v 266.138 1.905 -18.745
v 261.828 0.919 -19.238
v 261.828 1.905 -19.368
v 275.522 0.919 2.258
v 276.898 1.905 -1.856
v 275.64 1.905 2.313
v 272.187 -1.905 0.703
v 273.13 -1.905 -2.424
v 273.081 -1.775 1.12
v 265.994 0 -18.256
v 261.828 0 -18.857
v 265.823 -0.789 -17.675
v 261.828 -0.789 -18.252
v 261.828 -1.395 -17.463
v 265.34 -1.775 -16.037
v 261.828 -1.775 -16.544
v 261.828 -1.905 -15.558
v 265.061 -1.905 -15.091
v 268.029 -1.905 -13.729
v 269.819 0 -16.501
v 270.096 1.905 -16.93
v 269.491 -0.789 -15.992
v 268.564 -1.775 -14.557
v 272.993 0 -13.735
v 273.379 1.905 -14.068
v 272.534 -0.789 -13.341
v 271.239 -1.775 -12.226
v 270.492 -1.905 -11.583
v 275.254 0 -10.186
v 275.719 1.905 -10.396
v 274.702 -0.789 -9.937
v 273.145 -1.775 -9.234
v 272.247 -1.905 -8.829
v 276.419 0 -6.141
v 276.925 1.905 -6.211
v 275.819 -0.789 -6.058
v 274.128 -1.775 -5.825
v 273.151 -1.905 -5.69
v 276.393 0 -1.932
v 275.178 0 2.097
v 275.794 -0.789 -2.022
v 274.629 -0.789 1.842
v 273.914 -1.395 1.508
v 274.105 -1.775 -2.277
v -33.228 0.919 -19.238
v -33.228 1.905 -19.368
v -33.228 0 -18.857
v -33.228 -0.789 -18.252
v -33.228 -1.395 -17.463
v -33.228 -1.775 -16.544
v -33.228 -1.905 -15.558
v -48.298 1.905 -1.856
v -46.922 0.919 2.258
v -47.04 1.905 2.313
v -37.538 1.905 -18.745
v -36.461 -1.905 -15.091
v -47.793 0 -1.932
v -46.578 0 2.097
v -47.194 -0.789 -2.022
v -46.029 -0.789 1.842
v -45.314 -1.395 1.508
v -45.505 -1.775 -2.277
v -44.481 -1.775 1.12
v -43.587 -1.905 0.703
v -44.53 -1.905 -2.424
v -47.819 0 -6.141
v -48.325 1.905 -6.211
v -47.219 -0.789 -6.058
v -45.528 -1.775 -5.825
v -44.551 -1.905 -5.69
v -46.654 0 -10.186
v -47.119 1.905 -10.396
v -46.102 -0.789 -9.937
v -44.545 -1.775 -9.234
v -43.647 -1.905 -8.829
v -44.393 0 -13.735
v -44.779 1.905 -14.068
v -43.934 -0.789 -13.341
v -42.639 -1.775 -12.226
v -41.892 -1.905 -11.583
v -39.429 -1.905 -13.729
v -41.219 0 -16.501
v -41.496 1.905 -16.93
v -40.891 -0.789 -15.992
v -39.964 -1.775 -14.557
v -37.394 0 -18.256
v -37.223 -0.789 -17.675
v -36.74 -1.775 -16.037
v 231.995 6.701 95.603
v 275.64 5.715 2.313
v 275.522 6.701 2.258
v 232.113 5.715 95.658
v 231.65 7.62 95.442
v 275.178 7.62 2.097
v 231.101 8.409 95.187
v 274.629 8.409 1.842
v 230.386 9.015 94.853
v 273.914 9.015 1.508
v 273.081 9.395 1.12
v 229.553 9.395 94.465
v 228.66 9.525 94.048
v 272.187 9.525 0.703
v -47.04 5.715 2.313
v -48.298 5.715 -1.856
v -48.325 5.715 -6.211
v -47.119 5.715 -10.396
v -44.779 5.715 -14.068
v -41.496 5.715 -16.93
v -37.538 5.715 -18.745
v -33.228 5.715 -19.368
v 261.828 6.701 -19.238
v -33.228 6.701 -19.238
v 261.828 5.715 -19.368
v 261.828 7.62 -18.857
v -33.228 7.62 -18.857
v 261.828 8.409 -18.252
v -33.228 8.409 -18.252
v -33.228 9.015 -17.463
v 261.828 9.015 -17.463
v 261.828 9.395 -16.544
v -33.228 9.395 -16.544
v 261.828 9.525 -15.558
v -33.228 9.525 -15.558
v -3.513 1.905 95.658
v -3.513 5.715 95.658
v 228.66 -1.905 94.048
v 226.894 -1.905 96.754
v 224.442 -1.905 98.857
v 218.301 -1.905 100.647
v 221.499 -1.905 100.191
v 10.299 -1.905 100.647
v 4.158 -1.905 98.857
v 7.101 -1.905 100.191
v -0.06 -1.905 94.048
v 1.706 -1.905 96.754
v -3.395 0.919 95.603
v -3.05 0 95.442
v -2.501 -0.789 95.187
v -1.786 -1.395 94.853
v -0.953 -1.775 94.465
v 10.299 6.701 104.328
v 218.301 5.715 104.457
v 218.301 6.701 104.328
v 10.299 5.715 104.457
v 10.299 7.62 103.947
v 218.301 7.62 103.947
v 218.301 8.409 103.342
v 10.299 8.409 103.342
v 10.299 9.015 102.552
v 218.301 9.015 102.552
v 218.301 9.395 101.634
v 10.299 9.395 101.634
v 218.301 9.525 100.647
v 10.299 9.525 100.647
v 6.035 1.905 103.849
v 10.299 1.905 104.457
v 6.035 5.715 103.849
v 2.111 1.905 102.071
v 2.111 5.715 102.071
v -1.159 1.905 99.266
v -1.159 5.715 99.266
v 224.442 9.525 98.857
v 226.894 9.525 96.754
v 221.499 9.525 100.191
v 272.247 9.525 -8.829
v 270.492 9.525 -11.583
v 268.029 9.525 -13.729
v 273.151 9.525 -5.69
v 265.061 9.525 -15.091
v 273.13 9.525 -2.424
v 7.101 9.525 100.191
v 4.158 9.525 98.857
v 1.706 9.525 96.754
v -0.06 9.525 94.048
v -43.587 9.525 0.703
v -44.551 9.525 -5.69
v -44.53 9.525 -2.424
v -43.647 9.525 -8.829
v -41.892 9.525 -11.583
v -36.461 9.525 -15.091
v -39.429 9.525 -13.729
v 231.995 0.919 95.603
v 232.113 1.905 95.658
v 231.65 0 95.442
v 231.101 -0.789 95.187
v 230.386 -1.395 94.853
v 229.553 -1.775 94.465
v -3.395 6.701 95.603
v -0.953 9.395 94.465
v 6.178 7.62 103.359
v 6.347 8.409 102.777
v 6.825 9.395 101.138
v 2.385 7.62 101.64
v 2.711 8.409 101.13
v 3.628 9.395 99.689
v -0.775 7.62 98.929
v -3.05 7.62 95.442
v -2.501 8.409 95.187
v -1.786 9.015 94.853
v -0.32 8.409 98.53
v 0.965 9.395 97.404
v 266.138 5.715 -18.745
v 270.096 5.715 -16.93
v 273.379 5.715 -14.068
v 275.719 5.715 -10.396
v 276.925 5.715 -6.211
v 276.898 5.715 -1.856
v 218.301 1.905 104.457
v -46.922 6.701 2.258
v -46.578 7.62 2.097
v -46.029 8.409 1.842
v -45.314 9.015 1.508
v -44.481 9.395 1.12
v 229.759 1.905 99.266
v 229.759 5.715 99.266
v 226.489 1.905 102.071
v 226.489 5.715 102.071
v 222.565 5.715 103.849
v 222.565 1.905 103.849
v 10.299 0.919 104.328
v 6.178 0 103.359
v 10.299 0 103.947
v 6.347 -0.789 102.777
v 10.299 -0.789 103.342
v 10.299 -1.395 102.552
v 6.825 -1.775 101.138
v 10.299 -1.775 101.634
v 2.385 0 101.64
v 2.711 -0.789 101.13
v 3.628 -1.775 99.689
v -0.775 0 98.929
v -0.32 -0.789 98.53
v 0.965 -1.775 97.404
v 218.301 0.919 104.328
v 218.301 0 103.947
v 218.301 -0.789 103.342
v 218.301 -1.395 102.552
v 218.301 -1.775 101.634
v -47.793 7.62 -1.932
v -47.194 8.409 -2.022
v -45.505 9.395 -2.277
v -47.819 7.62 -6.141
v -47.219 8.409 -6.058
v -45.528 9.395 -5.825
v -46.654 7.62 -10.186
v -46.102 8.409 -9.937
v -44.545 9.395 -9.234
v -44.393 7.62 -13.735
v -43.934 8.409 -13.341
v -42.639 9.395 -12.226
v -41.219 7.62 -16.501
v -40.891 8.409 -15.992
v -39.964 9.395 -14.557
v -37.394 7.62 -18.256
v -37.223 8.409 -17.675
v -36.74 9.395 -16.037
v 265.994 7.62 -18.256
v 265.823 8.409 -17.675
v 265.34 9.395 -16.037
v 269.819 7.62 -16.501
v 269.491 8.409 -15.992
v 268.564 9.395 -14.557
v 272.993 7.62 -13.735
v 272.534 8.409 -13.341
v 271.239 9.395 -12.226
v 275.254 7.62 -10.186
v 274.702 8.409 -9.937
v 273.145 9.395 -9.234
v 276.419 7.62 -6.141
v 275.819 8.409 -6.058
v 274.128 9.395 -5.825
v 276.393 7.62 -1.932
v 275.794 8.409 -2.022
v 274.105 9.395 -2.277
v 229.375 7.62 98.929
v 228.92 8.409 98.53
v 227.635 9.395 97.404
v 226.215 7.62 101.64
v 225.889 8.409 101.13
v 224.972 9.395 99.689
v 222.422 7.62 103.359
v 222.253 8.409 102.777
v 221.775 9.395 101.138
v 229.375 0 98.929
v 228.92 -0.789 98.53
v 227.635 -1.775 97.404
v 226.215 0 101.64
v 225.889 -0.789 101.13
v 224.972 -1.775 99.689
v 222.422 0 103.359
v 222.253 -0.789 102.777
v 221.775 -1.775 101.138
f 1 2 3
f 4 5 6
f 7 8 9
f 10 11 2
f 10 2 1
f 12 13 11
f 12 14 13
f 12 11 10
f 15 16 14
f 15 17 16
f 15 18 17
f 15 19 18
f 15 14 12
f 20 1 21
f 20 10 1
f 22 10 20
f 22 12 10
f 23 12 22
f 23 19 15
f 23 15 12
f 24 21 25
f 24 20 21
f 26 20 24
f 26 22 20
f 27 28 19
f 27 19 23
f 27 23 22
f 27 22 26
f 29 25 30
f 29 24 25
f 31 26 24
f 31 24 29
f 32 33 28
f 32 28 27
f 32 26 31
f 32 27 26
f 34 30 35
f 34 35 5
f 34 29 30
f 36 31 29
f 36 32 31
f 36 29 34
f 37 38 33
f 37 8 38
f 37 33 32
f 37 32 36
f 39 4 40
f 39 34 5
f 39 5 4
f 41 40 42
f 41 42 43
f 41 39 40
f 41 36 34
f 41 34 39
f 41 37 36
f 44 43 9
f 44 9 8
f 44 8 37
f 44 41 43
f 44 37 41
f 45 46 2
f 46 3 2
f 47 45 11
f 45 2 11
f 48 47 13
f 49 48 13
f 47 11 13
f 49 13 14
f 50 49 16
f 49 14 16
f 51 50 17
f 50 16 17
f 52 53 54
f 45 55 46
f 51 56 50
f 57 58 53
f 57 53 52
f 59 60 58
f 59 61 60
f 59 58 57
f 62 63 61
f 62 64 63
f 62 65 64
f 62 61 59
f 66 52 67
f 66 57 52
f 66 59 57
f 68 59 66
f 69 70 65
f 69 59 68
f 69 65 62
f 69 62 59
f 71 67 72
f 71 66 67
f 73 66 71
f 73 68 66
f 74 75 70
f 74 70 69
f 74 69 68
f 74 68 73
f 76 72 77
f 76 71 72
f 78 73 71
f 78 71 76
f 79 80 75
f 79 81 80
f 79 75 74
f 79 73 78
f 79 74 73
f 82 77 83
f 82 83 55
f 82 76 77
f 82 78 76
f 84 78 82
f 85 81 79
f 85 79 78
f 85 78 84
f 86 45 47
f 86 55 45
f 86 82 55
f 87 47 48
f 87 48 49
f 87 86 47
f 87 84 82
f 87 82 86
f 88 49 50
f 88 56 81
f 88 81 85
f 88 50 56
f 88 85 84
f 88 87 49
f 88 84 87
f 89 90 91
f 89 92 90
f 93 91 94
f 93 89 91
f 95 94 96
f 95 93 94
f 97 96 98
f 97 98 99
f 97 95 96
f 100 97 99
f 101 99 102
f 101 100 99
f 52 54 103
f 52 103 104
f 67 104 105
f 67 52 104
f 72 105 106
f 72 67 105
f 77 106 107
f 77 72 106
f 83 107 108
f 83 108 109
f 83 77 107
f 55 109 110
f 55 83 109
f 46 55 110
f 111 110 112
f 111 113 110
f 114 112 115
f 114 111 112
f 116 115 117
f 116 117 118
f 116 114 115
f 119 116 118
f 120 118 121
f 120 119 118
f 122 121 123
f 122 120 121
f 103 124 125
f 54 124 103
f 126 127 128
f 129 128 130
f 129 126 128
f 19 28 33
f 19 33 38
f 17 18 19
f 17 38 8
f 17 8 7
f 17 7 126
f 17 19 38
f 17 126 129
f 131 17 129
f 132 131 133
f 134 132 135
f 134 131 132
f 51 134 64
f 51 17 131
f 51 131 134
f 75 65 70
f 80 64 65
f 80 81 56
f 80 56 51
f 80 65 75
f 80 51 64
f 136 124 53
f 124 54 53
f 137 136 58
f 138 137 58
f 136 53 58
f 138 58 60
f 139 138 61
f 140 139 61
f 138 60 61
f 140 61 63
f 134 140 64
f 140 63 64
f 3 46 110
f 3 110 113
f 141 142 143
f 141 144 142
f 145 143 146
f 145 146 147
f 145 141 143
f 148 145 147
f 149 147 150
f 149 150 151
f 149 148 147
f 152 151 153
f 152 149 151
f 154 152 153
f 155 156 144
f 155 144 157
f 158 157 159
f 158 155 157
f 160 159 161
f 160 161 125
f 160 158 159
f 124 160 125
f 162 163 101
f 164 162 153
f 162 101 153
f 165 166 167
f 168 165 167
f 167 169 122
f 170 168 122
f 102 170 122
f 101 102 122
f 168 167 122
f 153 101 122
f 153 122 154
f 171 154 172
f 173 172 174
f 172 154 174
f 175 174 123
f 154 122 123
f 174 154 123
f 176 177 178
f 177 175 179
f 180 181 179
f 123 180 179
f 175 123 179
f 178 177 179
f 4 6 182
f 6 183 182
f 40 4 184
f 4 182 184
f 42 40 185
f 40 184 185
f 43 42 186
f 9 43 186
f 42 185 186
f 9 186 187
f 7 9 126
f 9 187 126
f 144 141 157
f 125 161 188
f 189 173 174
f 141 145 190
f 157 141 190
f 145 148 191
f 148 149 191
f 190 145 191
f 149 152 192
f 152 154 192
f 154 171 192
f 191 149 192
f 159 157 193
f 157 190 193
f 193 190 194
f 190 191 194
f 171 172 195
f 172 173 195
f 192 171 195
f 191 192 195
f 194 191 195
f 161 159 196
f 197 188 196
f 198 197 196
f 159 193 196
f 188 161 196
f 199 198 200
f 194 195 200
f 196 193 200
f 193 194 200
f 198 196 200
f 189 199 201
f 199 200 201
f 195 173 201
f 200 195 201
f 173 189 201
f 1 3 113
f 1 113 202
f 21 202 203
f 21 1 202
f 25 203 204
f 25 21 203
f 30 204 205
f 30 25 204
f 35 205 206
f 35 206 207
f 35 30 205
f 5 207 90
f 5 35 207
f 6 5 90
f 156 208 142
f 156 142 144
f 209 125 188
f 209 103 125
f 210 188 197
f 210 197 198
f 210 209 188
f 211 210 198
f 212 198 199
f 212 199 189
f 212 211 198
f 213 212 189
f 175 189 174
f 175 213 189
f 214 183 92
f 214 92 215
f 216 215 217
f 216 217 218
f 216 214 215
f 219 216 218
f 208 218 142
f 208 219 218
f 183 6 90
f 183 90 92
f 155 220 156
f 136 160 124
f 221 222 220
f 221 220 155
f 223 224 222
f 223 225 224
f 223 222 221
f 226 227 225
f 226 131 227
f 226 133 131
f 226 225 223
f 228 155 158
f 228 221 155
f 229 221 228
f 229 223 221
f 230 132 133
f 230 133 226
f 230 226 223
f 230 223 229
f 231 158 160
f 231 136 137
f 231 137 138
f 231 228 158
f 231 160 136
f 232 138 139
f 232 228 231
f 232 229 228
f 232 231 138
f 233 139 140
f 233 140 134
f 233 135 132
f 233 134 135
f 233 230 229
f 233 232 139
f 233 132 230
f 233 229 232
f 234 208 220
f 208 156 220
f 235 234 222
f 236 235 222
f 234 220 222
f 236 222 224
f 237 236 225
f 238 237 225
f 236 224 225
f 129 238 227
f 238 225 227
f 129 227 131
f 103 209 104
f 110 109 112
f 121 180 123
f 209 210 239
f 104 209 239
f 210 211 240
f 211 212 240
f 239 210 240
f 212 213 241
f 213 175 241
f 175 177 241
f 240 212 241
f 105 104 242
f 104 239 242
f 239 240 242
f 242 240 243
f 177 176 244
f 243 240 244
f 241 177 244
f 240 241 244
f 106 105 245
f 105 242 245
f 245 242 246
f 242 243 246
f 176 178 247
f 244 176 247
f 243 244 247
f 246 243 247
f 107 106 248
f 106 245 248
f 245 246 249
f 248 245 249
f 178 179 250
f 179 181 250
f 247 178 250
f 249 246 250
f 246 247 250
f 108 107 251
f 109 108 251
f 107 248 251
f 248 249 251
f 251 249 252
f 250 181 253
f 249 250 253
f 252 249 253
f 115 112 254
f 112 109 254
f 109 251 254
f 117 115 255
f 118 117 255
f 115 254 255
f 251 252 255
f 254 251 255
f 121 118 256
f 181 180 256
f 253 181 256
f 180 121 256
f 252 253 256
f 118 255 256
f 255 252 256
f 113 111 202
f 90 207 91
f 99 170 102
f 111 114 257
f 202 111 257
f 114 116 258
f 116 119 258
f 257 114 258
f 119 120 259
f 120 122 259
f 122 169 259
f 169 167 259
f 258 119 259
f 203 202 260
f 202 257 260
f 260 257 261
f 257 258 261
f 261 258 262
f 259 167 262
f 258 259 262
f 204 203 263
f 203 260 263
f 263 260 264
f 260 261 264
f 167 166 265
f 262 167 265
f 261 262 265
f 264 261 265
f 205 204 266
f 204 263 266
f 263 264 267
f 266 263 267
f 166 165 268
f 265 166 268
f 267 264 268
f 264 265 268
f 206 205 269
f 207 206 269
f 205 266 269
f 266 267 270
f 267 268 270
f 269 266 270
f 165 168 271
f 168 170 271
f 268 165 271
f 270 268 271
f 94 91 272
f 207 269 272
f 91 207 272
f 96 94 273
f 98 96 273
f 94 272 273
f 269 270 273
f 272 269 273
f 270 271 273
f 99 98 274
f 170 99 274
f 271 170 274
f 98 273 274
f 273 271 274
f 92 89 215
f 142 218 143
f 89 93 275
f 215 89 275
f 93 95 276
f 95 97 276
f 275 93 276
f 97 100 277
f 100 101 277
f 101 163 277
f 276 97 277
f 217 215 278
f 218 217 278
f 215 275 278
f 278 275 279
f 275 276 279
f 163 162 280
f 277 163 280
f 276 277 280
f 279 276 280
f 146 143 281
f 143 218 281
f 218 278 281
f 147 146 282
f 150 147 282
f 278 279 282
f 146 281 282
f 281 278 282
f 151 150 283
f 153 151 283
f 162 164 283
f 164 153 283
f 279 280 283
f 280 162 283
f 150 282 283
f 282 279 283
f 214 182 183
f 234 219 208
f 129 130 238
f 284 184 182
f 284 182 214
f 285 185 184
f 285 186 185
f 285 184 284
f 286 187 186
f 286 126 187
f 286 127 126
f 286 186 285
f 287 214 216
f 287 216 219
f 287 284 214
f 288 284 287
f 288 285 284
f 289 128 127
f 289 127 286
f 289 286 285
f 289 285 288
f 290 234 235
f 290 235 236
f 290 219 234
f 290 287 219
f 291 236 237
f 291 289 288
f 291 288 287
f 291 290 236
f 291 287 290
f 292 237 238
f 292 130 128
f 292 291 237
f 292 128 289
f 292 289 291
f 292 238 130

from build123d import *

# Parameters (mm, degrees)
BOSS_EXTRUDE1_DEPTH = 7.62
FILLET1_R           = 2.54
SCALE1_SCALE        = 1.5


with BuildPart() as part:
    # Sketch1 → Boss-Extrude1 (new body)
    with BuildSketch(Plane(origin=(0, 0, 0), x_dir=(1, 0, 0), z_dir=(0, 1, 0))):
        with BuildLine():
            Line((15.948005464, 0), (212.651994536, 0))
            ThreePointArc((212.651994536, 0), (221.220851626, -4.701035979), (221.860081653, -14.453801539))
            Line((221.860081653, -14.453801539), (192.841756086, -76.683801539))
            ThreePointArc((192.841756086, -76.683801539), (189.09263299, -80.958857089), (183.63366897, -82.55))
            Line((183.63366897, -82.55), (44.96633103, -82.55))
            ThreePointArc((44.96633103, -82.55), (39.50736701, -80.958857089), (35.758243914, -76.683801539))
            Line((35.758243914, -76.683801539), (6.739918347, -14.453801539))
            ThreePointArc((6.739918347, -14.453801539), (7.379148374, -4.701035979), (15.948005464, 0))
        make_face()
    extrude(amount=BOSS_EXTRUDE1_DEPTH)

    # Fillet1
    fillet1_edges = [part.edges().sort_by_distance(p)[0] for p in [
        (7.379148374, 7.62, 4.701035979),
        (114.3, 0, 0),
        (221.220851626, 0, 4.701035979),
        (21.249081131, 7.62, 45.568801539),
        (39.50736701, 7.62, 80.958857089),
        (114.3, 7.62, 82.55),
        (189.09263299, 7.62, 80.958857089),
        (207.350918869, 7.62, 45.568801539),
        (221.220851626, 7.62, 4.701035979),
        (114.3, 7.62, 0),
        (207.350918869, 0, 45.568801539),
        (189.09263299, 0, 80.958857089),
        (114.3, 0, 82.55),
        (39.50736701, 0, 80.958857089),
        (21.249081131, 0, 45.568801539),
        (7.379148374, 0, 4.701035979),
    ]]
    fillet(fillet1_edges, radius=FILLET1_R)


with BuildPart() as part_1:
    # Scale1: scaled about (114.3, 3.81, 38.735119428)
    add(part.part.scale(SCALE1_SCALE).moved(Location((-57.15, -1.905, -19.367559714))))


solid = part_1.part
